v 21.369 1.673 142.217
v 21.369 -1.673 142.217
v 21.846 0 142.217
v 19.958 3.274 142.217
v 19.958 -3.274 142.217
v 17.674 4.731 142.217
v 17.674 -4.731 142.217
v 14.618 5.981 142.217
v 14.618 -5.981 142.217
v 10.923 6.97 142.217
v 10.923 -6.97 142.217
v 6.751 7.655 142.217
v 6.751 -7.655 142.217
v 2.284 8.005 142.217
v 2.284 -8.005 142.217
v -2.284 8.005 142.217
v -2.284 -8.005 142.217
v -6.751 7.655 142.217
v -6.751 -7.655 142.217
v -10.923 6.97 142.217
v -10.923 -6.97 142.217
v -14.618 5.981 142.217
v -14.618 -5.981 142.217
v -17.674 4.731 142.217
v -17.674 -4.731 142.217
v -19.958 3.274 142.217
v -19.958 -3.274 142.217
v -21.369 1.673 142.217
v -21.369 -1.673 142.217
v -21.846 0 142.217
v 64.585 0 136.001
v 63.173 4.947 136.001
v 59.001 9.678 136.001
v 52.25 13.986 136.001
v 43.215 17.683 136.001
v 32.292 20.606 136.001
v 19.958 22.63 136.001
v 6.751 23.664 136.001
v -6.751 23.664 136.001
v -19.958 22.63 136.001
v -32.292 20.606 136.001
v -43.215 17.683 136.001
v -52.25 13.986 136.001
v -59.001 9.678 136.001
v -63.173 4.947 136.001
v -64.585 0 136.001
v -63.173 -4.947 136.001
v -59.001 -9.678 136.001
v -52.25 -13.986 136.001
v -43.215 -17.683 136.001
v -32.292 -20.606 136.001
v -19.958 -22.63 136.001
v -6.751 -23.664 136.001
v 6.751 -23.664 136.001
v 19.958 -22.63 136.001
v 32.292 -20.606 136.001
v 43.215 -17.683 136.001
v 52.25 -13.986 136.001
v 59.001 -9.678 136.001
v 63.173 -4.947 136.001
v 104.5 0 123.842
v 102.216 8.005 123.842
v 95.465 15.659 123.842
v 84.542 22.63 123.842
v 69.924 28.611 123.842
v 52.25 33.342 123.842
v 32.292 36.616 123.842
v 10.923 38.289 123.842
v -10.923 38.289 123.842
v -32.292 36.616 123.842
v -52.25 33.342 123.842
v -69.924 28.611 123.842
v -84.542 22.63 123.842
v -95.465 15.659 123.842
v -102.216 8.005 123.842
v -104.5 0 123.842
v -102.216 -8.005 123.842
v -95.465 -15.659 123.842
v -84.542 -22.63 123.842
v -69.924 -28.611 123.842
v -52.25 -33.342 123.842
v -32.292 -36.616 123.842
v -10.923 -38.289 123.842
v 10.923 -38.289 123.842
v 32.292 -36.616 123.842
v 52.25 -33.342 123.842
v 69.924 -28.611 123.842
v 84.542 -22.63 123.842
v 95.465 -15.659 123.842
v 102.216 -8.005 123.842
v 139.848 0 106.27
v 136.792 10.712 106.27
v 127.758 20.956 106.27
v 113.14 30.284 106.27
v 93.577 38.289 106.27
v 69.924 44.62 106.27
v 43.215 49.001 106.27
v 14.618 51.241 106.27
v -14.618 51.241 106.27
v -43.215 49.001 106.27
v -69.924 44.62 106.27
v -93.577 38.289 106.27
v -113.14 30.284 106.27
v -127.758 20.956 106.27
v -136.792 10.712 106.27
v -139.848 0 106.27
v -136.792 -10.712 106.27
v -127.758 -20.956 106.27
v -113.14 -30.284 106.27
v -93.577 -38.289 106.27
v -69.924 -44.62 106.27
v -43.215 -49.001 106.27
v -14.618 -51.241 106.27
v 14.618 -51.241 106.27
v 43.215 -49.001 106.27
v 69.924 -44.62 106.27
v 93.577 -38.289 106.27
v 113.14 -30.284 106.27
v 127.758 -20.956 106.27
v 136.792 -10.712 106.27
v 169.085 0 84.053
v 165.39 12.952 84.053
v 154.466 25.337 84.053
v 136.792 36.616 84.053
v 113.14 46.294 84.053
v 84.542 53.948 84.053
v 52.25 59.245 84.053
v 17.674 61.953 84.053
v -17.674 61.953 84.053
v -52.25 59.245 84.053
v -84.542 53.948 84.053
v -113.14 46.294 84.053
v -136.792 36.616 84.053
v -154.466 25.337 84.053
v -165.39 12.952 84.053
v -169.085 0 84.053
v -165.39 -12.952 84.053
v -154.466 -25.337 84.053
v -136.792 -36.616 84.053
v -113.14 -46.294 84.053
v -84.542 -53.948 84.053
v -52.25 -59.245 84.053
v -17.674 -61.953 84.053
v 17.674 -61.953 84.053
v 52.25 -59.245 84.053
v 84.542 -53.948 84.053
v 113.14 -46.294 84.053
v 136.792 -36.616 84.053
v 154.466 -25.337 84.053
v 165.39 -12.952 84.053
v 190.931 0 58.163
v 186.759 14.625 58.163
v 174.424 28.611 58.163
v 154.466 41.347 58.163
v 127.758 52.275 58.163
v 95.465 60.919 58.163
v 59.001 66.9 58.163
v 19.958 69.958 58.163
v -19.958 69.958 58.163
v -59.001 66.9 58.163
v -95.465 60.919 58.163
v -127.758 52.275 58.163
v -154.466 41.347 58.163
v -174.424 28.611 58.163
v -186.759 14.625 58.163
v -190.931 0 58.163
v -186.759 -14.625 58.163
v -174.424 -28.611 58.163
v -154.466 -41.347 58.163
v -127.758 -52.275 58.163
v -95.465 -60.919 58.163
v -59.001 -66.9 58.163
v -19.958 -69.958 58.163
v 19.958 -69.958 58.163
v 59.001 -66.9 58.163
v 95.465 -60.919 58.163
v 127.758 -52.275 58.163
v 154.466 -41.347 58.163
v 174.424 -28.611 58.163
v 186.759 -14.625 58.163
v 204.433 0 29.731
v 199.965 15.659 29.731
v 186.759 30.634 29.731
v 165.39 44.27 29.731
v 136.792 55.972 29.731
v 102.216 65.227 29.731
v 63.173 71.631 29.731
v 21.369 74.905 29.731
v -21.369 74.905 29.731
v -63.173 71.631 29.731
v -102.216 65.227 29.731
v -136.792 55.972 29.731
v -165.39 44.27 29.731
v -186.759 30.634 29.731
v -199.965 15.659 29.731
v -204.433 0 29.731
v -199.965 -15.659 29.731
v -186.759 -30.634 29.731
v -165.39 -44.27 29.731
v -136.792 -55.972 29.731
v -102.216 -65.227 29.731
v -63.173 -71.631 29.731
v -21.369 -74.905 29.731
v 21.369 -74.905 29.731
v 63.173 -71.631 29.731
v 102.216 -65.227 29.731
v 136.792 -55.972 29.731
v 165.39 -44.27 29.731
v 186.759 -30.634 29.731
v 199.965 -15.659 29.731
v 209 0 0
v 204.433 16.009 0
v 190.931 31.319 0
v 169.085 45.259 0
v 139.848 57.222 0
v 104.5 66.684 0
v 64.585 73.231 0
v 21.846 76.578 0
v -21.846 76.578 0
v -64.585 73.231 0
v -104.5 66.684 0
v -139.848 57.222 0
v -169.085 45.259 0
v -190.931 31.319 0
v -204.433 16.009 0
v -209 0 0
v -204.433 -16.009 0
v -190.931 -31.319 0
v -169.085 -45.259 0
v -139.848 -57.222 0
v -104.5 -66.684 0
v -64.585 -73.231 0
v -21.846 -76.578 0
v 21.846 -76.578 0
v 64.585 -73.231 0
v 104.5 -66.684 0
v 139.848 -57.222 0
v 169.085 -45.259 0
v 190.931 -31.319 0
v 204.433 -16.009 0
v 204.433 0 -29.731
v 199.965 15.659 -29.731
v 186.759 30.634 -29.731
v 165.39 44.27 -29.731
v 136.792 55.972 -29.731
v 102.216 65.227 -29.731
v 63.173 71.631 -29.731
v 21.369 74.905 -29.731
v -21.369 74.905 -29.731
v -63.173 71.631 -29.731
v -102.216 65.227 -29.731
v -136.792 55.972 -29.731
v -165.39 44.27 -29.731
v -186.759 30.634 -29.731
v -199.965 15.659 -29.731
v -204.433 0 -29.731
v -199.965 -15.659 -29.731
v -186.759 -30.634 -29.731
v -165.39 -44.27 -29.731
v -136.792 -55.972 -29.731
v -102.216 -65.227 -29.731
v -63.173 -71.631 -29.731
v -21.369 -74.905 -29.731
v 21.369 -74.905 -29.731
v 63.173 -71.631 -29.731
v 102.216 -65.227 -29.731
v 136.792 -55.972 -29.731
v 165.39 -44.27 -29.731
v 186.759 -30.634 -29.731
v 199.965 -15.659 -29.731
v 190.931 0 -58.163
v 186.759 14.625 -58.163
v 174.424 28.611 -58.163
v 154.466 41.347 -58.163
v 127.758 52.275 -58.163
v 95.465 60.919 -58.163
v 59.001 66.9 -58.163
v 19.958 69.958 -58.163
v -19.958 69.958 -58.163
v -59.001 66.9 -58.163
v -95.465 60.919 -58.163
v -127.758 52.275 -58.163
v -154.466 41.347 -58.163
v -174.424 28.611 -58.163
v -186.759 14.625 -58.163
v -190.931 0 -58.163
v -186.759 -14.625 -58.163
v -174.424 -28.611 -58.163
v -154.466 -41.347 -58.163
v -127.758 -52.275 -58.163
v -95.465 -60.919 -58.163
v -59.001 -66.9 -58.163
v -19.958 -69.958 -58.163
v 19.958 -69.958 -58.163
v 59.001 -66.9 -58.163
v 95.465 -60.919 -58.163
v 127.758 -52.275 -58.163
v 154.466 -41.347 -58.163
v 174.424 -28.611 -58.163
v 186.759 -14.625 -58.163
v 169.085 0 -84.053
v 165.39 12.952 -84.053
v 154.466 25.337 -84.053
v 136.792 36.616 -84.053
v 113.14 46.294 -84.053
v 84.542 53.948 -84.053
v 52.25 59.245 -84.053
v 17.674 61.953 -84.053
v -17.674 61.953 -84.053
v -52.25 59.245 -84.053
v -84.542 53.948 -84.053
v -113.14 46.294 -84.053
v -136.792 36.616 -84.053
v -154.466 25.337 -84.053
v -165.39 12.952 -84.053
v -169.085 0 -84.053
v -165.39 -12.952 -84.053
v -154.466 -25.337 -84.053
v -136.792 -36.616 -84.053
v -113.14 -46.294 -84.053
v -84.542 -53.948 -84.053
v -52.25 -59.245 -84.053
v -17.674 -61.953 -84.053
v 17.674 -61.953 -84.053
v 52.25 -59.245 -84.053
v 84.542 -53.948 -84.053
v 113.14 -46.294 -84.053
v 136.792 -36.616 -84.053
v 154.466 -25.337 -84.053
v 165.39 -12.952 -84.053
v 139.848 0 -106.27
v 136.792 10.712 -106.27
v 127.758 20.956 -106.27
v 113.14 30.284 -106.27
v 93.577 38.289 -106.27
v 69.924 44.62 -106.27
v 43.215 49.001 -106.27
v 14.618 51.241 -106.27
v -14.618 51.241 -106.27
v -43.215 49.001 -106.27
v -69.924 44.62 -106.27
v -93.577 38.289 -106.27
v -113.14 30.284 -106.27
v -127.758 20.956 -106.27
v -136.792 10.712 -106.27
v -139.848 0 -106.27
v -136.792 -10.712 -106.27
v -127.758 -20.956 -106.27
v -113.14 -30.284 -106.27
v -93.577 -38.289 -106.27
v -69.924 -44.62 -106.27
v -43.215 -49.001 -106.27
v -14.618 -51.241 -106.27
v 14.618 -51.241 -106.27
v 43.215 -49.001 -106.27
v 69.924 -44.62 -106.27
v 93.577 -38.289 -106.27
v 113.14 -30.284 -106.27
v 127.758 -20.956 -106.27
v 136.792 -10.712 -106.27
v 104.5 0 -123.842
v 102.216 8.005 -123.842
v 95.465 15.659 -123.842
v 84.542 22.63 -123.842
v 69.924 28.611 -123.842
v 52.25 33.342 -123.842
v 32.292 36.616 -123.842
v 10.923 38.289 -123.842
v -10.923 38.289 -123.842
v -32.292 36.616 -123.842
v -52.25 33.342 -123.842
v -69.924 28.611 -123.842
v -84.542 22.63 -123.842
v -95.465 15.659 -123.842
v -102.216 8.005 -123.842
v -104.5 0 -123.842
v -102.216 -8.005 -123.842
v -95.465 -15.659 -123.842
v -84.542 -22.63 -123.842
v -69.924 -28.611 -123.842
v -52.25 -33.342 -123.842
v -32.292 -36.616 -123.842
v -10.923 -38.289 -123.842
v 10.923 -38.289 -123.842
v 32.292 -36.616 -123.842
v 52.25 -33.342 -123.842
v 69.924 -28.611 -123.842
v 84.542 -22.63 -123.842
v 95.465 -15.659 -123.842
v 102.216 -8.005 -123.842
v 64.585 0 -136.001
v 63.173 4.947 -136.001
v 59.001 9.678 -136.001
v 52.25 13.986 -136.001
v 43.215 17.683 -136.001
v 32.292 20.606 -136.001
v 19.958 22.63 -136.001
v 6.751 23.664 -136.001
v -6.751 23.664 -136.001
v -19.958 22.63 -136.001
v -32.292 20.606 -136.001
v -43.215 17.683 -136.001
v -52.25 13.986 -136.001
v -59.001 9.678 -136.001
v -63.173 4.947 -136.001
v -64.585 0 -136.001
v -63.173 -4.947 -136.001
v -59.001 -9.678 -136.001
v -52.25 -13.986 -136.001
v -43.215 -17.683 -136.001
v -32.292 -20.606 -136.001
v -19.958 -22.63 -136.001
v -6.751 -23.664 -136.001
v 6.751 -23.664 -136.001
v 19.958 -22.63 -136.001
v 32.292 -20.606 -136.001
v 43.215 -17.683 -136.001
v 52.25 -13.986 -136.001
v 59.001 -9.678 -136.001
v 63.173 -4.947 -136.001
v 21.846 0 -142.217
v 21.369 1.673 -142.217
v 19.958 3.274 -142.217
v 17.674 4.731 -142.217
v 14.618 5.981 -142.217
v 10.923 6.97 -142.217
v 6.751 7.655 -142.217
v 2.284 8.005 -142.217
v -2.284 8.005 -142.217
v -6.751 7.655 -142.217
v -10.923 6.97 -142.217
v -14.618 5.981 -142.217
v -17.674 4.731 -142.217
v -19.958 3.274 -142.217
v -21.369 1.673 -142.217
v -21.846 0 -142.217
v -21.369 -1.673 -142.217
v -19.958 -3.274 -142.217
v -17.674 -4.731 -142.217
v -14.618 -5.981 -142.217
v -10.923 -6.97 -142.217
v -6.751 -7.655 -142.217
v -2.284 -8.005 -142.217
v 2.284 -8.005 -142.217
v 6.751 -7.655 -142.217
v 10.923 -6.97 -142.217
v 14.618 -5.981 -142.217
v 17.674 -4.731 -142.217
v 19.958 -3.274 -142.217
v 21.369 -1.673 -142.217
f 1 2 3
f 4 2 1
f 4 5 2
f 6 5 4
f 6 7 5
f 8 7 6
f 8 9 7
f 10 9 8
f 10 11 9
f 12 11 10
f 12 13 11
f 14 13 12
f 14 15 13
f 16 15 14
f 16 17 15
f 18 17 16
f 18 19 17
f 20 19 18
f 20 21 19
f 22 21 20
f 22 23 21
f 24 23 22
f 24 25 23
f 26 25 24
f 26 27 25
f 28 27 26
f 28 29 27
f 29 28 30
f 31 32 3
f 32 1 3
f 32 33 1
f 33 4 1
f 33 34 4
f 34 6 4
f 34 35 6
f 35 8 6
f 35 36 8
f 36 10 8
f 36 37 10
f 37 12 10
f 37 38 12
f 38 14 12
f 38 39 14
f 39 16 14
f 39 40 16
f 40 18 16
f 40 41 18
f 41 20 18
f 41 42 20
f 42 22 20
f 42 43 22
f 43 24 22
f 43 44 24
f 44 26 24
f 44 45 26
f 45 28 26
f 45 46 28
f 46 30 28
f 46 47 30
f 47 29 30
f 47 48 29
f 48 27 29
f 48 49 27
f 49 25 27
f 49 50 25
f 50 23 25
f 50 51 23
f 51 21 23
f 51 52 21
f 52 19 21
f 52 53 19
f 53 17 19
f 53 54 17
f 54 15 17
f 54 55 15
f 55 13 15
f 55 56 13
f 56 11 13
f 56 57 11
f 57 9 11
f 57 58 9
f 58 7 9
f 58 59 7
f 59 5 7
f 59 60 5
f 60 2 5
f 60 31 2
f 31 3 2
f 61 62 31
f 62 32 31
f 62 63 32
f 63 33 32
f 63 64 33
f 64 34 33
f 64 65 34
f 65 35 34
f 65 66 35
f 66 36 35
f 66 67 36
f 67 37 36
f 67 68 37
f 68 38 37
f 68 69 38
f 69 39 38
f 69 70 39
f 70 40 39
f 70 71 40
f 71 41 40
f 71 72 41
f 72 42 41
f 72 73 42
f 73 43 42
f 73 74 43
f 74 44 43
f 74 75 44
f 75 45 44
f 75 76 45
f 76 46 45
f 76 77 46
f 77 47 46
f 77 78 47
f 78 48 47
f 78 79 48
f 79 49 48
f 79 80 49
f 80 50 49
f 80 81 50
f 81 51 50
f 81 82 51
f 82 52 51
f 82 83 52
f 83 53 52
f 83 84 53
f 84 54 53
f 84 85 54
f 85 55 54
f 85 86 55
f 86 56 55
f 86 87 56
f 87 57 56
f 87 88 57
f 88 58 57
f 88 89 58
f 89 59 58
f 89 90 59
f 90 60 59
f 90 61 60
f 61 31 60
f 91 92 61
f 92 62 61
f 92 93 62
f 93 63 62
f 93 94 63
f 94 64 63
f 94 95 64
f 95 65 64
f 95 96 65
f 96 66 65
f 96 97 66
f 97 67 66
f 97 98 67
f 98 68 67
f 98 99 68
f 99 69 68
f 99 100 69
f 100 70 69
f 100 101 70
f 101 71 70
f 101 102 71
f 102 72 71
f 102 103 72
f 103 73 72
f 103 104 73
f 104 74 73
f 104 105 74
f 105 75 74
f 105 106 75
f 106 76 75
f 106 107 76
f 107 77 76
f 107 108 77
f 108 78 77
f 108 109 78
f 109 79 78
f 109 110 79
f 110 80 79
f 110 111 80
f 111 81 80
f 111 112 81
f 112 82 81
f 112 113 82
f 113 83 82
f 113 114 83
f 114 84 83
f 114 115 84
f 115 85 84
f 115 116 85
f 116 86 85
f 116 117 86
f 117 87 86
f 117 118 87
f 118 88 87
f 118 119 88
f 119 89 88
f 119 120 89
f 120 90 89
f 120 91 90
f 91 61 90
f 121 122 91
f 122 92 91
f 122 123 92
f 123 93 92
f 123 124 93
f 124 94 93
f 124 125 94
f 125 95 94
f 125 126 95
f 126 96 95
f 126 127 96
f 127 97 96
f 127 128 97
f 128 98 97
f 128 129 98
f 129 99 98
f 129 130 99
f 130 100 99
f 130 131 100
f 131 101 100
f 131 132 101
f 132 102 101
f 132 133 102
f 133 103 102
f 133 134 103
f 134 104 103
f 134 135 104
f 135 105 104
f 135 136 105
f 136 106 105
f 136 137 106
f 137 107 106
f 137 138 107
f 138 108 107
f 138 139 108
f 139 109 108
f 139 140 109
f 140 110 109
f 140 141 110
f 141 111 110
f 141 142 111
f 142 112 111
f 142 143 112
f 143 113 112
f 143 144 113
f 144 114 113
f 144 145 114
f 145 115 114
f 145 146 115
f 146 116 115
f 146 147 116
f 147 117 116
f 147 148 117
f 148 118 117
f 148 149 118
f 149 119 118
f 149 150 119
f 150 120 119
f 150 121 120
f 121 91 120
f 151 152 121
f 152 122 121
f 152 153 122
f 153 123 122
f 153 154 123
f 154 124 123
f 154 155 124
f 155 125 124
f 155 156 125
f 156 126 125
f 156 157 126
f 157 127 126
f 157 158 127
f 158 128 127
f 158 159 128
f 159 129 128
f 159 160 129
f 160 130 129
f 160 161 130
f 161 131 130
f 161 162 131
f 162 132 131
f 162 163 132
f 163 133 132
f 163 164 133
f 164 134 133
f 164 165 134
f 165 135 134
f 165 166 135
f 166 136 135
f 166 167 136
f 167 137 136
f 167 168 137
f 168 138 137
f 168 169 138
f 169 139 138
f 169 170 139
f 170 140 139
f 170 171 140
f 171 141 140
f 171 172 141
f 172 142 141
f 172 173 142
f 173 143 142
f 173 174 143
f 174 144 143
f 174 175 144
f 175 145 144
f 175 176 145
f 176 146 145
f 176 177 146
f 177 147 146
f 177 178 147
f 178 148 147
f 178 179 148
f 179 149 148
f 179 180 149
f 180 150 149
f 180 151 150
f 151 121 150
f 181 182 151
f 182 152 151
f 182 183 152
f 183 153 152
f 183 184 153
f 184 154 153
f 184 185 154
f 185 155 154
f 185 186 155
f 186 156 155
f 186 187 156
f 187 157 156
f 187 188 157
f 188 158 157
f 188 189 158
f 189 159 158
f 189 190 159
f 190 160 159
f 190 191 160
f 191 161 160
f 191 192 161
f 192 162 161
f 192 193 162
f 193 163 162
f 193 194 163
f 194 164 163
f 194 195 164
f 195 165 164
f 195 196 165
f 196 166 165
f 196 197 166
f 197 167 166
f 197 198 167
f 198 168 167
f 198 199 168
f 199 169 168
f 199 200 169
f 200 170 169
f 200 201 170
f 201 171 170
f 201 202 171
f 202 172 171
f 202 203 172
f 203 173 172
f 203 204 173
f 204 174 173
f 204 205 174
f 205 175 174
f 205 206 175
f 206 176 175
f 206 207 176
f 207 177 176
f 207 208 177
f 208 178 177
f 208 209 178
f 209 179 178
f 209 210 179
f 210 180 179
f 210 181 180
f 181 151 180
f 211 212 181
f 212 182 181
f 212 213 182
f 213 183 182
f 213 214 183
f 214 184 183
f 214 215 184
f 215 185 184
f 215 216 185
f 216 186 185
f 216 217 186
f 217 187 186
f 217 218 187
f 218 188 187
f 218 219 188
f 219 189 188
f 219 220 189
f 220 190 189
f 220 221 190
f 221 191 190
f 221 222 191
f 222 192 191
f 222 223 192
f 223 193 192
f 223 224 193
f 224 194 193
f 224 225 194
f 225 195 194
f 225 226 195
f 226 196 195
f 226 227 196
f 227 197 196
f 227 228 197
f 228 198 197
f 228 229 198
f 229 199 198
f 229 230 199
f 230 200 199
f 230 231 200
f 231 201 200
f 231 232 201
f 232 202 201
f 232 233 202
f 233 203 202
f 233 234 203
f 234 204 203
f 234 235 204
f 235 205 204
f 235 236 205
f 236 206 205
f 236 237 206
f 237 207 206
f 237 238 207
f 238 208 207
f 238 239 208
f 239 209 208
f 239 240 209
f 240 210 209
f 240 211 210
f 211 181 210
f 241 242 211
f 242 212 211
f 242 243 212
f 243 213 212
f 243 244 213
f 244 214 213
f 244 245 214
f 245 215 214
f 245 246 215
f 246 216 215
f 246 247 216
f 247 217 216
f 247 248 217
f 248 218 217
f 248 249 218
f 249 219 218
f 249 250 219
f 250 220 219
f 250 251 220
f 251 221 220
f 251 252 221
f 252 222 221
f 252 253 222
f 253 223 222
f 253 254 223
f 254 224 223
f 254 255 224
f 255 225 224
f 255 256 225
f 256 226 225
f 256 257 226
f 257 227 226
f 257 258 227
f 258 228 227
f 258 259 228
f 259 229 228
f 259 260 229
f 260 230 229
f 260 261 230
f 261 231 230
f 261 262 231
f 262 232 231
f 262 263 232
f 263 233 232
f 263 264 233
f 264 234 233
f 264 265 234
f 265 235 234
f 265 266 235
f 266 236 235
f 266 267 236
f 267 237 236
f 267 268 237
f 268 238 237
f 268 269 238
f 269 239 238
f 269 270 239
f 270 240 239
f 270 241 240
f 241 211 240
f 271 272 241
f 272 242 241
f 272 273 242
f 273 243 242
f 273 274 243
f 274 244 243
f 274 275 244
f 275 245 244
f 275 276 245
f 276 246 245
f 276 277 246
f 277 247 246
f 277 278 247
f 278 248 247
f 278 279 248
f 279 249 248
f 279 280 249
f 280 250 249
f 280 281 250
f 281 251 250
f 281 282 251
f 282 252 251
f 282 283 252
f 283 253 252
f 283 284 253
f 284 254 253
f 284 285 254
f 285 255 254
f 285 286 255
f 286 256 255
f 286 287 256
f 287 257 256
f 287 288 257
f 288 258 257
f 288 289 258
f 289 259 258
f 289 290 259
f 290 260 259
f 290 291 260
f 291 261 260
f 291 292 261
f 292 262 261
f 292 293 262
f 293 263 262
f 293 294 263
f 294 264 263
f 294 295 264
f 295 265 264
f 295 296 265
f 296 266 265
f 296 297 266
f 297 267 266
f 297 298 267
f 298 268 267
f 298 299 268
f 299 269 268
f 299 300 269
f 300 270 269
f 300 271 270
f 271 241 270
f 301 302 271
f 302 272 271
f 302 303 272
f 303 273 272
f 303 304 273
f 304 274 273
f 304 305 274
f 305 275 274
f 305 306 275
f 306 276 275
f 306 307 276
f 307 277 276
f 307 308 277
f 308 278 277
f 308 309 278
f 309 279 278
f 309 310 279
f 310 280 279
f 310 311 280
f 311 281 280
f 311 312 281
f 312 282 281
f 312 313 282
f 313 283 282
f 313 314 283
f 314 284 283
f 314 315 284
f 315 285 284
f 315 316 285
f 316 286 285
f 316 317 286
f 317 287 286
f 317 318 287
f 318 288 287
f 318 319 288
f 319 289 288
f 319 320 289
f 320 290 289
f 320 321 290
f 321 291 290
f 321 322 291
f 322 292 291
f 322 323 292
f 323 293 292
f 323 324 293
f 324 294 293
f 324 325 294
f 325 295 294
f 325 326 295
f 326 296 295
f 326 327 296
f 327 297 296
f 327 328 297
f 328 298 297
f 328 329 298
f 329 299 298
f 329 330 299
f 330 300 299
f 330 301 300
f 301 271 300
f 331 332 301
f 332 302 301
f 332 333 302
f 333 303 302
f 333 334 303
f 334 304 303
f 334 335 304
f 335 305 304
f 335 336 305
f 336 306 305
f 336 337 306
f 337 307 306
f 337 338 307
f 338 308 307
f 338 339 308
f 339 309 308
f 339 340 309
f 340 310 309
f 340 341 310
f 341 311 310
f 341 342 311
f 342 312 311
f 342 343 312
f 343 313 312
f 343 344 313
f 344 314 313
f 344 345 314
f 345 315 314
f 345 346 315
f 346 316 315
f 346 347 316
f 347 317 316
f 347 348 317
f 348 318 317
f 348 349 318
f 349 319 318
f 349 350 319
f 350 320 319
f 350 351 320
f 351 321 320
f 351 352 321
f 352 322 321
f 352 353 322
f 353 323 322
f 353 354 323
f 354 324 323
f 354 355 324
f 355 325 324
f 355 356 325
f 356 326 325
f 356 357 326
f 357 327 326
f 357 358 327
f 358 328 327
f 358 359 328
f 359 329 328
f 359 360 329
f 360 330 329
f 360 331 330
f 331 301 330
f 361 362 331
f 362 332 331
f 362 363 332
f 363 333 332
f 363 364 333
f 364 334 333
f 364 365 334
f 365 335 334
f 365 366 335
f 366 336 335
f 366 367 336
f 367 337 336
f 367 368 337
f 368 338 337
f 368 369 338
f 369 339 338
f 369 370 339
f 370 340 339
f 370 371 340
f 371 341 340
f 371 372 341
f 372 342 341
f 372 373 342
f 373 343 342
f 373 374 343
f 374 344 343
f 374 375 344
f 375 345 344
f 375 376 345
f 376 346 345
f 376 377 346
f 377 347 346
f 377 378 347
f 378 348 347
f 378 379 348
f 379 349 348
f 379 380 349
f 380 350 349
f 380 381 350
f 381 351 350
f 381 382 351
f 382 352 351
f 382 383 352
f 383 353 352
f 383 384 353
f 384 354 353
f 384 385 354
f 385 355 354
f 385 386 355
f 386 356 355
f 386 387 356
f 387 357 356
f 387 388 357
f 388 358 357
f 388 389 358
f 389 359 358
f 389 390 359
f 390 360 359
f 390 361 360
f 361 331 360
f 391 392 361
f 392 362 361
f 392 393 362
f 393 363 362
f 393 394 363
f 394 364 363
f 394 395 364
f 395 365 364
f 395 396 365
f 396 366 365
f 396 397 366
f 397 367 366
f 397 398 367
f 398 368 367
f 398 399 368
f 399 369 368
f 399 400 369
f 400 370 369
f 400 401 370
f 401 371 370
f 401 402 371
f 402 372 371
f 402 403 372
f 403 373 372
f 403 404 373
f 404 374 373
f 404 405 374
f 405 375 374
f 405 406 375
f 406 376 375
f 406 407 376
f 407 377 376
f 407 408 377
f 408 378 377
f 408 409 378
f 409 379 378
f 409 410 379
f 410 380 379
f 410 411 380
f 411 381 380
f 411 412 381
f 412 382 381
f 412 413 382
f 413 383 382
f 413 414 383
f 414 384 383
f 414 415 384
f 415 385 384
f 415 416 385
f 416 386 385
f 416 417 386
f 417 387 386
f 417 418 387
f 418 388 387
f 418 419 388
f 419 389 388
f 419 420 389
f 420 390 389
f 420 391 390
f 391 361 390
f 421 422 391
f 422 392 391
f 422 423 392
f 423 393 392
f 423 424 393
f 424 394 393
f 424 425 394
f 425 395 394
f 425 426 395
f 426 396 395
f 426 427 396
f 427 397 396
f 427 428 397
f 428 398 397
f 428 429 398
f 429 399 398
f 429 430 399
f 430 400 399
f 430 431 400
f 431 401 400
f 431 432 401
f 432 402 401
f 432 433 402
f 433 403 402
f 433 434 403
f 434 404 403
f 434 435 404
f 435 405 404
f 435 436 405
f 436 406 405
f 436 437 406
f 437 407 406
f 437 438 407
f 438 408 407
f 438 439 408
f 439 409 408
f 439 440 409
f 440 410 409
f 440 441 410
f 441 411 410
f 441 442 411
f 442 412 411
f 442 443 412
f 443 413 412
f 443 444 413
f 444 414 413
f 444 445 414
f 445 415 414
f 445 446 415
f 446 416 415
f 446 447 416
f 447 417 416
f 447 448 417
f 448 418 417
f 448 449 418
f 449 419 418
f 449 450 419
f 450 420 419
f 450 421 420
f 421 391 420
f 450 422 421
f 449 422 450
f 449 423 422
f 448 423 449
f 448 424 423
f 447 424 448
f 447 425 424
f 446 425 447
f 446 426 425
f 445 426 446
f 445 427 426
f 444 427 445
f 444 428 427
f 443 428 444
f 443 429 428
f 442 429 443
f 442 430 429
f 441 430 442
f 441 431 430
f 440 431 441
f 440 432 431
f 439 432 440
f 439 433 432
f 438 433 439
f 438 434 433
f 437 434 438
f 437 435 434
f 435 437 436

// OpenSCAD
// Generated by SolidPython 1.0.1 on 2020-07-29 00:46:53


scale(v = [19, 7, 13]) {
	sphere(r = 11);
}
/***********************************************
*********      SolidPython code:      **********
************************************************
 
# import packages: SolidPython
from solid import *
from solid.utils import *
from itertools import chain, combinations, permutations


class Resize:

    def __init__(self, scad_file):
        self.scad_file = scad_file
        #self.scad_file = import_scad(scad_file)
        # cone/cylinder param:
        self.r1 = 0
        self.r2 = 0
        self.h = 0
        # rectangular prism param:
        self.w = 0
        self.l = 0
        # ellipse param:
        self.r = 0

    # import OpenScad code (file name corresponds to shape)


    # classify shape + parameters
    def assign(self, param1, param2, param3):
        if self.scad_file == 'cone.scad':
            self.r1 = param1
            self.r2 = param2
            self.h = param3
        elif self.scad_file == 'cylinder.scad':
            self.r1 = param1
            self.r2 = param2
            self.h = param3
        elif self.scad_file == 'rectangularPrism.scad':
            self.h = param1
            self.l = param2
            self.w = param3
        else:
            self.r = param1
            self.h = param2

    # resize parameters
    def iterate(self):
        x = range(3, 20, 2)
        i = 1
        if self.scad_file == 'cone.scad':
            tempList = list(permutations(x, 2))
            for temp in tempList:
                param1 = temp[0]
                param2 = temp[1]
                filepath = 'produced_scad_files/' + 'cone' + str(param1) + '_' + str(param2) + '_' + '.scad'
                scad_render_to_file(cylinder(h=param1, r1=param2, r2=0), filepath)

        elif self.scad_file == 'cylinder.scad':
            tempList = list(permutations(x, 3))
            for temp in tempList:
                param1 = temp[0]
                param2 = temp[1]
                filepath = 'produced_scad_files/' + 'cylinder' + str(param1) + '_' + str(param2) + '_' + '.scad'
                scad_render_to_file(cylinder(h=param1, r1=param2, r2=param2), filepath)

        elif self.scad_file == 'rectangularPrism.scad':
            tempList = list(permutations(x, 3))
            for temp in tempList:
                param1 = temp[0]
                param2 = temp[1]
                param3 = temp[2]
                filepath = 'produced_scad_files/' + 'rectangularPrism' + str(param1) + '_' + str(param2) + '_' + str(
                    param3) + '.scad'
                scad_render_to_file(cube(size=(param1, param2, param3)), filepath)

        elif self.scad_file == 'ellipse.scad':
            tempList = list(permutations(x, 4))
            for temp in tempList:
                param1 = temp[0]
                param2 = temp[1]
                param3 = temp[2]
                param4 = temp[3]
                filepath = 'produced_scad_files/' + 'ellipse' + str(param1) + '_' + str(param2) + '_' + str(param3) + '_' + str(param4) + '.scad'
                scad_render_to_file(scale([param1, param2, param3])(sphere(r=param4)), filepath)

    def render_to_scadfile(self):
        scad_render_to_file(scad, 'example.scad') 
 
************************************************/
